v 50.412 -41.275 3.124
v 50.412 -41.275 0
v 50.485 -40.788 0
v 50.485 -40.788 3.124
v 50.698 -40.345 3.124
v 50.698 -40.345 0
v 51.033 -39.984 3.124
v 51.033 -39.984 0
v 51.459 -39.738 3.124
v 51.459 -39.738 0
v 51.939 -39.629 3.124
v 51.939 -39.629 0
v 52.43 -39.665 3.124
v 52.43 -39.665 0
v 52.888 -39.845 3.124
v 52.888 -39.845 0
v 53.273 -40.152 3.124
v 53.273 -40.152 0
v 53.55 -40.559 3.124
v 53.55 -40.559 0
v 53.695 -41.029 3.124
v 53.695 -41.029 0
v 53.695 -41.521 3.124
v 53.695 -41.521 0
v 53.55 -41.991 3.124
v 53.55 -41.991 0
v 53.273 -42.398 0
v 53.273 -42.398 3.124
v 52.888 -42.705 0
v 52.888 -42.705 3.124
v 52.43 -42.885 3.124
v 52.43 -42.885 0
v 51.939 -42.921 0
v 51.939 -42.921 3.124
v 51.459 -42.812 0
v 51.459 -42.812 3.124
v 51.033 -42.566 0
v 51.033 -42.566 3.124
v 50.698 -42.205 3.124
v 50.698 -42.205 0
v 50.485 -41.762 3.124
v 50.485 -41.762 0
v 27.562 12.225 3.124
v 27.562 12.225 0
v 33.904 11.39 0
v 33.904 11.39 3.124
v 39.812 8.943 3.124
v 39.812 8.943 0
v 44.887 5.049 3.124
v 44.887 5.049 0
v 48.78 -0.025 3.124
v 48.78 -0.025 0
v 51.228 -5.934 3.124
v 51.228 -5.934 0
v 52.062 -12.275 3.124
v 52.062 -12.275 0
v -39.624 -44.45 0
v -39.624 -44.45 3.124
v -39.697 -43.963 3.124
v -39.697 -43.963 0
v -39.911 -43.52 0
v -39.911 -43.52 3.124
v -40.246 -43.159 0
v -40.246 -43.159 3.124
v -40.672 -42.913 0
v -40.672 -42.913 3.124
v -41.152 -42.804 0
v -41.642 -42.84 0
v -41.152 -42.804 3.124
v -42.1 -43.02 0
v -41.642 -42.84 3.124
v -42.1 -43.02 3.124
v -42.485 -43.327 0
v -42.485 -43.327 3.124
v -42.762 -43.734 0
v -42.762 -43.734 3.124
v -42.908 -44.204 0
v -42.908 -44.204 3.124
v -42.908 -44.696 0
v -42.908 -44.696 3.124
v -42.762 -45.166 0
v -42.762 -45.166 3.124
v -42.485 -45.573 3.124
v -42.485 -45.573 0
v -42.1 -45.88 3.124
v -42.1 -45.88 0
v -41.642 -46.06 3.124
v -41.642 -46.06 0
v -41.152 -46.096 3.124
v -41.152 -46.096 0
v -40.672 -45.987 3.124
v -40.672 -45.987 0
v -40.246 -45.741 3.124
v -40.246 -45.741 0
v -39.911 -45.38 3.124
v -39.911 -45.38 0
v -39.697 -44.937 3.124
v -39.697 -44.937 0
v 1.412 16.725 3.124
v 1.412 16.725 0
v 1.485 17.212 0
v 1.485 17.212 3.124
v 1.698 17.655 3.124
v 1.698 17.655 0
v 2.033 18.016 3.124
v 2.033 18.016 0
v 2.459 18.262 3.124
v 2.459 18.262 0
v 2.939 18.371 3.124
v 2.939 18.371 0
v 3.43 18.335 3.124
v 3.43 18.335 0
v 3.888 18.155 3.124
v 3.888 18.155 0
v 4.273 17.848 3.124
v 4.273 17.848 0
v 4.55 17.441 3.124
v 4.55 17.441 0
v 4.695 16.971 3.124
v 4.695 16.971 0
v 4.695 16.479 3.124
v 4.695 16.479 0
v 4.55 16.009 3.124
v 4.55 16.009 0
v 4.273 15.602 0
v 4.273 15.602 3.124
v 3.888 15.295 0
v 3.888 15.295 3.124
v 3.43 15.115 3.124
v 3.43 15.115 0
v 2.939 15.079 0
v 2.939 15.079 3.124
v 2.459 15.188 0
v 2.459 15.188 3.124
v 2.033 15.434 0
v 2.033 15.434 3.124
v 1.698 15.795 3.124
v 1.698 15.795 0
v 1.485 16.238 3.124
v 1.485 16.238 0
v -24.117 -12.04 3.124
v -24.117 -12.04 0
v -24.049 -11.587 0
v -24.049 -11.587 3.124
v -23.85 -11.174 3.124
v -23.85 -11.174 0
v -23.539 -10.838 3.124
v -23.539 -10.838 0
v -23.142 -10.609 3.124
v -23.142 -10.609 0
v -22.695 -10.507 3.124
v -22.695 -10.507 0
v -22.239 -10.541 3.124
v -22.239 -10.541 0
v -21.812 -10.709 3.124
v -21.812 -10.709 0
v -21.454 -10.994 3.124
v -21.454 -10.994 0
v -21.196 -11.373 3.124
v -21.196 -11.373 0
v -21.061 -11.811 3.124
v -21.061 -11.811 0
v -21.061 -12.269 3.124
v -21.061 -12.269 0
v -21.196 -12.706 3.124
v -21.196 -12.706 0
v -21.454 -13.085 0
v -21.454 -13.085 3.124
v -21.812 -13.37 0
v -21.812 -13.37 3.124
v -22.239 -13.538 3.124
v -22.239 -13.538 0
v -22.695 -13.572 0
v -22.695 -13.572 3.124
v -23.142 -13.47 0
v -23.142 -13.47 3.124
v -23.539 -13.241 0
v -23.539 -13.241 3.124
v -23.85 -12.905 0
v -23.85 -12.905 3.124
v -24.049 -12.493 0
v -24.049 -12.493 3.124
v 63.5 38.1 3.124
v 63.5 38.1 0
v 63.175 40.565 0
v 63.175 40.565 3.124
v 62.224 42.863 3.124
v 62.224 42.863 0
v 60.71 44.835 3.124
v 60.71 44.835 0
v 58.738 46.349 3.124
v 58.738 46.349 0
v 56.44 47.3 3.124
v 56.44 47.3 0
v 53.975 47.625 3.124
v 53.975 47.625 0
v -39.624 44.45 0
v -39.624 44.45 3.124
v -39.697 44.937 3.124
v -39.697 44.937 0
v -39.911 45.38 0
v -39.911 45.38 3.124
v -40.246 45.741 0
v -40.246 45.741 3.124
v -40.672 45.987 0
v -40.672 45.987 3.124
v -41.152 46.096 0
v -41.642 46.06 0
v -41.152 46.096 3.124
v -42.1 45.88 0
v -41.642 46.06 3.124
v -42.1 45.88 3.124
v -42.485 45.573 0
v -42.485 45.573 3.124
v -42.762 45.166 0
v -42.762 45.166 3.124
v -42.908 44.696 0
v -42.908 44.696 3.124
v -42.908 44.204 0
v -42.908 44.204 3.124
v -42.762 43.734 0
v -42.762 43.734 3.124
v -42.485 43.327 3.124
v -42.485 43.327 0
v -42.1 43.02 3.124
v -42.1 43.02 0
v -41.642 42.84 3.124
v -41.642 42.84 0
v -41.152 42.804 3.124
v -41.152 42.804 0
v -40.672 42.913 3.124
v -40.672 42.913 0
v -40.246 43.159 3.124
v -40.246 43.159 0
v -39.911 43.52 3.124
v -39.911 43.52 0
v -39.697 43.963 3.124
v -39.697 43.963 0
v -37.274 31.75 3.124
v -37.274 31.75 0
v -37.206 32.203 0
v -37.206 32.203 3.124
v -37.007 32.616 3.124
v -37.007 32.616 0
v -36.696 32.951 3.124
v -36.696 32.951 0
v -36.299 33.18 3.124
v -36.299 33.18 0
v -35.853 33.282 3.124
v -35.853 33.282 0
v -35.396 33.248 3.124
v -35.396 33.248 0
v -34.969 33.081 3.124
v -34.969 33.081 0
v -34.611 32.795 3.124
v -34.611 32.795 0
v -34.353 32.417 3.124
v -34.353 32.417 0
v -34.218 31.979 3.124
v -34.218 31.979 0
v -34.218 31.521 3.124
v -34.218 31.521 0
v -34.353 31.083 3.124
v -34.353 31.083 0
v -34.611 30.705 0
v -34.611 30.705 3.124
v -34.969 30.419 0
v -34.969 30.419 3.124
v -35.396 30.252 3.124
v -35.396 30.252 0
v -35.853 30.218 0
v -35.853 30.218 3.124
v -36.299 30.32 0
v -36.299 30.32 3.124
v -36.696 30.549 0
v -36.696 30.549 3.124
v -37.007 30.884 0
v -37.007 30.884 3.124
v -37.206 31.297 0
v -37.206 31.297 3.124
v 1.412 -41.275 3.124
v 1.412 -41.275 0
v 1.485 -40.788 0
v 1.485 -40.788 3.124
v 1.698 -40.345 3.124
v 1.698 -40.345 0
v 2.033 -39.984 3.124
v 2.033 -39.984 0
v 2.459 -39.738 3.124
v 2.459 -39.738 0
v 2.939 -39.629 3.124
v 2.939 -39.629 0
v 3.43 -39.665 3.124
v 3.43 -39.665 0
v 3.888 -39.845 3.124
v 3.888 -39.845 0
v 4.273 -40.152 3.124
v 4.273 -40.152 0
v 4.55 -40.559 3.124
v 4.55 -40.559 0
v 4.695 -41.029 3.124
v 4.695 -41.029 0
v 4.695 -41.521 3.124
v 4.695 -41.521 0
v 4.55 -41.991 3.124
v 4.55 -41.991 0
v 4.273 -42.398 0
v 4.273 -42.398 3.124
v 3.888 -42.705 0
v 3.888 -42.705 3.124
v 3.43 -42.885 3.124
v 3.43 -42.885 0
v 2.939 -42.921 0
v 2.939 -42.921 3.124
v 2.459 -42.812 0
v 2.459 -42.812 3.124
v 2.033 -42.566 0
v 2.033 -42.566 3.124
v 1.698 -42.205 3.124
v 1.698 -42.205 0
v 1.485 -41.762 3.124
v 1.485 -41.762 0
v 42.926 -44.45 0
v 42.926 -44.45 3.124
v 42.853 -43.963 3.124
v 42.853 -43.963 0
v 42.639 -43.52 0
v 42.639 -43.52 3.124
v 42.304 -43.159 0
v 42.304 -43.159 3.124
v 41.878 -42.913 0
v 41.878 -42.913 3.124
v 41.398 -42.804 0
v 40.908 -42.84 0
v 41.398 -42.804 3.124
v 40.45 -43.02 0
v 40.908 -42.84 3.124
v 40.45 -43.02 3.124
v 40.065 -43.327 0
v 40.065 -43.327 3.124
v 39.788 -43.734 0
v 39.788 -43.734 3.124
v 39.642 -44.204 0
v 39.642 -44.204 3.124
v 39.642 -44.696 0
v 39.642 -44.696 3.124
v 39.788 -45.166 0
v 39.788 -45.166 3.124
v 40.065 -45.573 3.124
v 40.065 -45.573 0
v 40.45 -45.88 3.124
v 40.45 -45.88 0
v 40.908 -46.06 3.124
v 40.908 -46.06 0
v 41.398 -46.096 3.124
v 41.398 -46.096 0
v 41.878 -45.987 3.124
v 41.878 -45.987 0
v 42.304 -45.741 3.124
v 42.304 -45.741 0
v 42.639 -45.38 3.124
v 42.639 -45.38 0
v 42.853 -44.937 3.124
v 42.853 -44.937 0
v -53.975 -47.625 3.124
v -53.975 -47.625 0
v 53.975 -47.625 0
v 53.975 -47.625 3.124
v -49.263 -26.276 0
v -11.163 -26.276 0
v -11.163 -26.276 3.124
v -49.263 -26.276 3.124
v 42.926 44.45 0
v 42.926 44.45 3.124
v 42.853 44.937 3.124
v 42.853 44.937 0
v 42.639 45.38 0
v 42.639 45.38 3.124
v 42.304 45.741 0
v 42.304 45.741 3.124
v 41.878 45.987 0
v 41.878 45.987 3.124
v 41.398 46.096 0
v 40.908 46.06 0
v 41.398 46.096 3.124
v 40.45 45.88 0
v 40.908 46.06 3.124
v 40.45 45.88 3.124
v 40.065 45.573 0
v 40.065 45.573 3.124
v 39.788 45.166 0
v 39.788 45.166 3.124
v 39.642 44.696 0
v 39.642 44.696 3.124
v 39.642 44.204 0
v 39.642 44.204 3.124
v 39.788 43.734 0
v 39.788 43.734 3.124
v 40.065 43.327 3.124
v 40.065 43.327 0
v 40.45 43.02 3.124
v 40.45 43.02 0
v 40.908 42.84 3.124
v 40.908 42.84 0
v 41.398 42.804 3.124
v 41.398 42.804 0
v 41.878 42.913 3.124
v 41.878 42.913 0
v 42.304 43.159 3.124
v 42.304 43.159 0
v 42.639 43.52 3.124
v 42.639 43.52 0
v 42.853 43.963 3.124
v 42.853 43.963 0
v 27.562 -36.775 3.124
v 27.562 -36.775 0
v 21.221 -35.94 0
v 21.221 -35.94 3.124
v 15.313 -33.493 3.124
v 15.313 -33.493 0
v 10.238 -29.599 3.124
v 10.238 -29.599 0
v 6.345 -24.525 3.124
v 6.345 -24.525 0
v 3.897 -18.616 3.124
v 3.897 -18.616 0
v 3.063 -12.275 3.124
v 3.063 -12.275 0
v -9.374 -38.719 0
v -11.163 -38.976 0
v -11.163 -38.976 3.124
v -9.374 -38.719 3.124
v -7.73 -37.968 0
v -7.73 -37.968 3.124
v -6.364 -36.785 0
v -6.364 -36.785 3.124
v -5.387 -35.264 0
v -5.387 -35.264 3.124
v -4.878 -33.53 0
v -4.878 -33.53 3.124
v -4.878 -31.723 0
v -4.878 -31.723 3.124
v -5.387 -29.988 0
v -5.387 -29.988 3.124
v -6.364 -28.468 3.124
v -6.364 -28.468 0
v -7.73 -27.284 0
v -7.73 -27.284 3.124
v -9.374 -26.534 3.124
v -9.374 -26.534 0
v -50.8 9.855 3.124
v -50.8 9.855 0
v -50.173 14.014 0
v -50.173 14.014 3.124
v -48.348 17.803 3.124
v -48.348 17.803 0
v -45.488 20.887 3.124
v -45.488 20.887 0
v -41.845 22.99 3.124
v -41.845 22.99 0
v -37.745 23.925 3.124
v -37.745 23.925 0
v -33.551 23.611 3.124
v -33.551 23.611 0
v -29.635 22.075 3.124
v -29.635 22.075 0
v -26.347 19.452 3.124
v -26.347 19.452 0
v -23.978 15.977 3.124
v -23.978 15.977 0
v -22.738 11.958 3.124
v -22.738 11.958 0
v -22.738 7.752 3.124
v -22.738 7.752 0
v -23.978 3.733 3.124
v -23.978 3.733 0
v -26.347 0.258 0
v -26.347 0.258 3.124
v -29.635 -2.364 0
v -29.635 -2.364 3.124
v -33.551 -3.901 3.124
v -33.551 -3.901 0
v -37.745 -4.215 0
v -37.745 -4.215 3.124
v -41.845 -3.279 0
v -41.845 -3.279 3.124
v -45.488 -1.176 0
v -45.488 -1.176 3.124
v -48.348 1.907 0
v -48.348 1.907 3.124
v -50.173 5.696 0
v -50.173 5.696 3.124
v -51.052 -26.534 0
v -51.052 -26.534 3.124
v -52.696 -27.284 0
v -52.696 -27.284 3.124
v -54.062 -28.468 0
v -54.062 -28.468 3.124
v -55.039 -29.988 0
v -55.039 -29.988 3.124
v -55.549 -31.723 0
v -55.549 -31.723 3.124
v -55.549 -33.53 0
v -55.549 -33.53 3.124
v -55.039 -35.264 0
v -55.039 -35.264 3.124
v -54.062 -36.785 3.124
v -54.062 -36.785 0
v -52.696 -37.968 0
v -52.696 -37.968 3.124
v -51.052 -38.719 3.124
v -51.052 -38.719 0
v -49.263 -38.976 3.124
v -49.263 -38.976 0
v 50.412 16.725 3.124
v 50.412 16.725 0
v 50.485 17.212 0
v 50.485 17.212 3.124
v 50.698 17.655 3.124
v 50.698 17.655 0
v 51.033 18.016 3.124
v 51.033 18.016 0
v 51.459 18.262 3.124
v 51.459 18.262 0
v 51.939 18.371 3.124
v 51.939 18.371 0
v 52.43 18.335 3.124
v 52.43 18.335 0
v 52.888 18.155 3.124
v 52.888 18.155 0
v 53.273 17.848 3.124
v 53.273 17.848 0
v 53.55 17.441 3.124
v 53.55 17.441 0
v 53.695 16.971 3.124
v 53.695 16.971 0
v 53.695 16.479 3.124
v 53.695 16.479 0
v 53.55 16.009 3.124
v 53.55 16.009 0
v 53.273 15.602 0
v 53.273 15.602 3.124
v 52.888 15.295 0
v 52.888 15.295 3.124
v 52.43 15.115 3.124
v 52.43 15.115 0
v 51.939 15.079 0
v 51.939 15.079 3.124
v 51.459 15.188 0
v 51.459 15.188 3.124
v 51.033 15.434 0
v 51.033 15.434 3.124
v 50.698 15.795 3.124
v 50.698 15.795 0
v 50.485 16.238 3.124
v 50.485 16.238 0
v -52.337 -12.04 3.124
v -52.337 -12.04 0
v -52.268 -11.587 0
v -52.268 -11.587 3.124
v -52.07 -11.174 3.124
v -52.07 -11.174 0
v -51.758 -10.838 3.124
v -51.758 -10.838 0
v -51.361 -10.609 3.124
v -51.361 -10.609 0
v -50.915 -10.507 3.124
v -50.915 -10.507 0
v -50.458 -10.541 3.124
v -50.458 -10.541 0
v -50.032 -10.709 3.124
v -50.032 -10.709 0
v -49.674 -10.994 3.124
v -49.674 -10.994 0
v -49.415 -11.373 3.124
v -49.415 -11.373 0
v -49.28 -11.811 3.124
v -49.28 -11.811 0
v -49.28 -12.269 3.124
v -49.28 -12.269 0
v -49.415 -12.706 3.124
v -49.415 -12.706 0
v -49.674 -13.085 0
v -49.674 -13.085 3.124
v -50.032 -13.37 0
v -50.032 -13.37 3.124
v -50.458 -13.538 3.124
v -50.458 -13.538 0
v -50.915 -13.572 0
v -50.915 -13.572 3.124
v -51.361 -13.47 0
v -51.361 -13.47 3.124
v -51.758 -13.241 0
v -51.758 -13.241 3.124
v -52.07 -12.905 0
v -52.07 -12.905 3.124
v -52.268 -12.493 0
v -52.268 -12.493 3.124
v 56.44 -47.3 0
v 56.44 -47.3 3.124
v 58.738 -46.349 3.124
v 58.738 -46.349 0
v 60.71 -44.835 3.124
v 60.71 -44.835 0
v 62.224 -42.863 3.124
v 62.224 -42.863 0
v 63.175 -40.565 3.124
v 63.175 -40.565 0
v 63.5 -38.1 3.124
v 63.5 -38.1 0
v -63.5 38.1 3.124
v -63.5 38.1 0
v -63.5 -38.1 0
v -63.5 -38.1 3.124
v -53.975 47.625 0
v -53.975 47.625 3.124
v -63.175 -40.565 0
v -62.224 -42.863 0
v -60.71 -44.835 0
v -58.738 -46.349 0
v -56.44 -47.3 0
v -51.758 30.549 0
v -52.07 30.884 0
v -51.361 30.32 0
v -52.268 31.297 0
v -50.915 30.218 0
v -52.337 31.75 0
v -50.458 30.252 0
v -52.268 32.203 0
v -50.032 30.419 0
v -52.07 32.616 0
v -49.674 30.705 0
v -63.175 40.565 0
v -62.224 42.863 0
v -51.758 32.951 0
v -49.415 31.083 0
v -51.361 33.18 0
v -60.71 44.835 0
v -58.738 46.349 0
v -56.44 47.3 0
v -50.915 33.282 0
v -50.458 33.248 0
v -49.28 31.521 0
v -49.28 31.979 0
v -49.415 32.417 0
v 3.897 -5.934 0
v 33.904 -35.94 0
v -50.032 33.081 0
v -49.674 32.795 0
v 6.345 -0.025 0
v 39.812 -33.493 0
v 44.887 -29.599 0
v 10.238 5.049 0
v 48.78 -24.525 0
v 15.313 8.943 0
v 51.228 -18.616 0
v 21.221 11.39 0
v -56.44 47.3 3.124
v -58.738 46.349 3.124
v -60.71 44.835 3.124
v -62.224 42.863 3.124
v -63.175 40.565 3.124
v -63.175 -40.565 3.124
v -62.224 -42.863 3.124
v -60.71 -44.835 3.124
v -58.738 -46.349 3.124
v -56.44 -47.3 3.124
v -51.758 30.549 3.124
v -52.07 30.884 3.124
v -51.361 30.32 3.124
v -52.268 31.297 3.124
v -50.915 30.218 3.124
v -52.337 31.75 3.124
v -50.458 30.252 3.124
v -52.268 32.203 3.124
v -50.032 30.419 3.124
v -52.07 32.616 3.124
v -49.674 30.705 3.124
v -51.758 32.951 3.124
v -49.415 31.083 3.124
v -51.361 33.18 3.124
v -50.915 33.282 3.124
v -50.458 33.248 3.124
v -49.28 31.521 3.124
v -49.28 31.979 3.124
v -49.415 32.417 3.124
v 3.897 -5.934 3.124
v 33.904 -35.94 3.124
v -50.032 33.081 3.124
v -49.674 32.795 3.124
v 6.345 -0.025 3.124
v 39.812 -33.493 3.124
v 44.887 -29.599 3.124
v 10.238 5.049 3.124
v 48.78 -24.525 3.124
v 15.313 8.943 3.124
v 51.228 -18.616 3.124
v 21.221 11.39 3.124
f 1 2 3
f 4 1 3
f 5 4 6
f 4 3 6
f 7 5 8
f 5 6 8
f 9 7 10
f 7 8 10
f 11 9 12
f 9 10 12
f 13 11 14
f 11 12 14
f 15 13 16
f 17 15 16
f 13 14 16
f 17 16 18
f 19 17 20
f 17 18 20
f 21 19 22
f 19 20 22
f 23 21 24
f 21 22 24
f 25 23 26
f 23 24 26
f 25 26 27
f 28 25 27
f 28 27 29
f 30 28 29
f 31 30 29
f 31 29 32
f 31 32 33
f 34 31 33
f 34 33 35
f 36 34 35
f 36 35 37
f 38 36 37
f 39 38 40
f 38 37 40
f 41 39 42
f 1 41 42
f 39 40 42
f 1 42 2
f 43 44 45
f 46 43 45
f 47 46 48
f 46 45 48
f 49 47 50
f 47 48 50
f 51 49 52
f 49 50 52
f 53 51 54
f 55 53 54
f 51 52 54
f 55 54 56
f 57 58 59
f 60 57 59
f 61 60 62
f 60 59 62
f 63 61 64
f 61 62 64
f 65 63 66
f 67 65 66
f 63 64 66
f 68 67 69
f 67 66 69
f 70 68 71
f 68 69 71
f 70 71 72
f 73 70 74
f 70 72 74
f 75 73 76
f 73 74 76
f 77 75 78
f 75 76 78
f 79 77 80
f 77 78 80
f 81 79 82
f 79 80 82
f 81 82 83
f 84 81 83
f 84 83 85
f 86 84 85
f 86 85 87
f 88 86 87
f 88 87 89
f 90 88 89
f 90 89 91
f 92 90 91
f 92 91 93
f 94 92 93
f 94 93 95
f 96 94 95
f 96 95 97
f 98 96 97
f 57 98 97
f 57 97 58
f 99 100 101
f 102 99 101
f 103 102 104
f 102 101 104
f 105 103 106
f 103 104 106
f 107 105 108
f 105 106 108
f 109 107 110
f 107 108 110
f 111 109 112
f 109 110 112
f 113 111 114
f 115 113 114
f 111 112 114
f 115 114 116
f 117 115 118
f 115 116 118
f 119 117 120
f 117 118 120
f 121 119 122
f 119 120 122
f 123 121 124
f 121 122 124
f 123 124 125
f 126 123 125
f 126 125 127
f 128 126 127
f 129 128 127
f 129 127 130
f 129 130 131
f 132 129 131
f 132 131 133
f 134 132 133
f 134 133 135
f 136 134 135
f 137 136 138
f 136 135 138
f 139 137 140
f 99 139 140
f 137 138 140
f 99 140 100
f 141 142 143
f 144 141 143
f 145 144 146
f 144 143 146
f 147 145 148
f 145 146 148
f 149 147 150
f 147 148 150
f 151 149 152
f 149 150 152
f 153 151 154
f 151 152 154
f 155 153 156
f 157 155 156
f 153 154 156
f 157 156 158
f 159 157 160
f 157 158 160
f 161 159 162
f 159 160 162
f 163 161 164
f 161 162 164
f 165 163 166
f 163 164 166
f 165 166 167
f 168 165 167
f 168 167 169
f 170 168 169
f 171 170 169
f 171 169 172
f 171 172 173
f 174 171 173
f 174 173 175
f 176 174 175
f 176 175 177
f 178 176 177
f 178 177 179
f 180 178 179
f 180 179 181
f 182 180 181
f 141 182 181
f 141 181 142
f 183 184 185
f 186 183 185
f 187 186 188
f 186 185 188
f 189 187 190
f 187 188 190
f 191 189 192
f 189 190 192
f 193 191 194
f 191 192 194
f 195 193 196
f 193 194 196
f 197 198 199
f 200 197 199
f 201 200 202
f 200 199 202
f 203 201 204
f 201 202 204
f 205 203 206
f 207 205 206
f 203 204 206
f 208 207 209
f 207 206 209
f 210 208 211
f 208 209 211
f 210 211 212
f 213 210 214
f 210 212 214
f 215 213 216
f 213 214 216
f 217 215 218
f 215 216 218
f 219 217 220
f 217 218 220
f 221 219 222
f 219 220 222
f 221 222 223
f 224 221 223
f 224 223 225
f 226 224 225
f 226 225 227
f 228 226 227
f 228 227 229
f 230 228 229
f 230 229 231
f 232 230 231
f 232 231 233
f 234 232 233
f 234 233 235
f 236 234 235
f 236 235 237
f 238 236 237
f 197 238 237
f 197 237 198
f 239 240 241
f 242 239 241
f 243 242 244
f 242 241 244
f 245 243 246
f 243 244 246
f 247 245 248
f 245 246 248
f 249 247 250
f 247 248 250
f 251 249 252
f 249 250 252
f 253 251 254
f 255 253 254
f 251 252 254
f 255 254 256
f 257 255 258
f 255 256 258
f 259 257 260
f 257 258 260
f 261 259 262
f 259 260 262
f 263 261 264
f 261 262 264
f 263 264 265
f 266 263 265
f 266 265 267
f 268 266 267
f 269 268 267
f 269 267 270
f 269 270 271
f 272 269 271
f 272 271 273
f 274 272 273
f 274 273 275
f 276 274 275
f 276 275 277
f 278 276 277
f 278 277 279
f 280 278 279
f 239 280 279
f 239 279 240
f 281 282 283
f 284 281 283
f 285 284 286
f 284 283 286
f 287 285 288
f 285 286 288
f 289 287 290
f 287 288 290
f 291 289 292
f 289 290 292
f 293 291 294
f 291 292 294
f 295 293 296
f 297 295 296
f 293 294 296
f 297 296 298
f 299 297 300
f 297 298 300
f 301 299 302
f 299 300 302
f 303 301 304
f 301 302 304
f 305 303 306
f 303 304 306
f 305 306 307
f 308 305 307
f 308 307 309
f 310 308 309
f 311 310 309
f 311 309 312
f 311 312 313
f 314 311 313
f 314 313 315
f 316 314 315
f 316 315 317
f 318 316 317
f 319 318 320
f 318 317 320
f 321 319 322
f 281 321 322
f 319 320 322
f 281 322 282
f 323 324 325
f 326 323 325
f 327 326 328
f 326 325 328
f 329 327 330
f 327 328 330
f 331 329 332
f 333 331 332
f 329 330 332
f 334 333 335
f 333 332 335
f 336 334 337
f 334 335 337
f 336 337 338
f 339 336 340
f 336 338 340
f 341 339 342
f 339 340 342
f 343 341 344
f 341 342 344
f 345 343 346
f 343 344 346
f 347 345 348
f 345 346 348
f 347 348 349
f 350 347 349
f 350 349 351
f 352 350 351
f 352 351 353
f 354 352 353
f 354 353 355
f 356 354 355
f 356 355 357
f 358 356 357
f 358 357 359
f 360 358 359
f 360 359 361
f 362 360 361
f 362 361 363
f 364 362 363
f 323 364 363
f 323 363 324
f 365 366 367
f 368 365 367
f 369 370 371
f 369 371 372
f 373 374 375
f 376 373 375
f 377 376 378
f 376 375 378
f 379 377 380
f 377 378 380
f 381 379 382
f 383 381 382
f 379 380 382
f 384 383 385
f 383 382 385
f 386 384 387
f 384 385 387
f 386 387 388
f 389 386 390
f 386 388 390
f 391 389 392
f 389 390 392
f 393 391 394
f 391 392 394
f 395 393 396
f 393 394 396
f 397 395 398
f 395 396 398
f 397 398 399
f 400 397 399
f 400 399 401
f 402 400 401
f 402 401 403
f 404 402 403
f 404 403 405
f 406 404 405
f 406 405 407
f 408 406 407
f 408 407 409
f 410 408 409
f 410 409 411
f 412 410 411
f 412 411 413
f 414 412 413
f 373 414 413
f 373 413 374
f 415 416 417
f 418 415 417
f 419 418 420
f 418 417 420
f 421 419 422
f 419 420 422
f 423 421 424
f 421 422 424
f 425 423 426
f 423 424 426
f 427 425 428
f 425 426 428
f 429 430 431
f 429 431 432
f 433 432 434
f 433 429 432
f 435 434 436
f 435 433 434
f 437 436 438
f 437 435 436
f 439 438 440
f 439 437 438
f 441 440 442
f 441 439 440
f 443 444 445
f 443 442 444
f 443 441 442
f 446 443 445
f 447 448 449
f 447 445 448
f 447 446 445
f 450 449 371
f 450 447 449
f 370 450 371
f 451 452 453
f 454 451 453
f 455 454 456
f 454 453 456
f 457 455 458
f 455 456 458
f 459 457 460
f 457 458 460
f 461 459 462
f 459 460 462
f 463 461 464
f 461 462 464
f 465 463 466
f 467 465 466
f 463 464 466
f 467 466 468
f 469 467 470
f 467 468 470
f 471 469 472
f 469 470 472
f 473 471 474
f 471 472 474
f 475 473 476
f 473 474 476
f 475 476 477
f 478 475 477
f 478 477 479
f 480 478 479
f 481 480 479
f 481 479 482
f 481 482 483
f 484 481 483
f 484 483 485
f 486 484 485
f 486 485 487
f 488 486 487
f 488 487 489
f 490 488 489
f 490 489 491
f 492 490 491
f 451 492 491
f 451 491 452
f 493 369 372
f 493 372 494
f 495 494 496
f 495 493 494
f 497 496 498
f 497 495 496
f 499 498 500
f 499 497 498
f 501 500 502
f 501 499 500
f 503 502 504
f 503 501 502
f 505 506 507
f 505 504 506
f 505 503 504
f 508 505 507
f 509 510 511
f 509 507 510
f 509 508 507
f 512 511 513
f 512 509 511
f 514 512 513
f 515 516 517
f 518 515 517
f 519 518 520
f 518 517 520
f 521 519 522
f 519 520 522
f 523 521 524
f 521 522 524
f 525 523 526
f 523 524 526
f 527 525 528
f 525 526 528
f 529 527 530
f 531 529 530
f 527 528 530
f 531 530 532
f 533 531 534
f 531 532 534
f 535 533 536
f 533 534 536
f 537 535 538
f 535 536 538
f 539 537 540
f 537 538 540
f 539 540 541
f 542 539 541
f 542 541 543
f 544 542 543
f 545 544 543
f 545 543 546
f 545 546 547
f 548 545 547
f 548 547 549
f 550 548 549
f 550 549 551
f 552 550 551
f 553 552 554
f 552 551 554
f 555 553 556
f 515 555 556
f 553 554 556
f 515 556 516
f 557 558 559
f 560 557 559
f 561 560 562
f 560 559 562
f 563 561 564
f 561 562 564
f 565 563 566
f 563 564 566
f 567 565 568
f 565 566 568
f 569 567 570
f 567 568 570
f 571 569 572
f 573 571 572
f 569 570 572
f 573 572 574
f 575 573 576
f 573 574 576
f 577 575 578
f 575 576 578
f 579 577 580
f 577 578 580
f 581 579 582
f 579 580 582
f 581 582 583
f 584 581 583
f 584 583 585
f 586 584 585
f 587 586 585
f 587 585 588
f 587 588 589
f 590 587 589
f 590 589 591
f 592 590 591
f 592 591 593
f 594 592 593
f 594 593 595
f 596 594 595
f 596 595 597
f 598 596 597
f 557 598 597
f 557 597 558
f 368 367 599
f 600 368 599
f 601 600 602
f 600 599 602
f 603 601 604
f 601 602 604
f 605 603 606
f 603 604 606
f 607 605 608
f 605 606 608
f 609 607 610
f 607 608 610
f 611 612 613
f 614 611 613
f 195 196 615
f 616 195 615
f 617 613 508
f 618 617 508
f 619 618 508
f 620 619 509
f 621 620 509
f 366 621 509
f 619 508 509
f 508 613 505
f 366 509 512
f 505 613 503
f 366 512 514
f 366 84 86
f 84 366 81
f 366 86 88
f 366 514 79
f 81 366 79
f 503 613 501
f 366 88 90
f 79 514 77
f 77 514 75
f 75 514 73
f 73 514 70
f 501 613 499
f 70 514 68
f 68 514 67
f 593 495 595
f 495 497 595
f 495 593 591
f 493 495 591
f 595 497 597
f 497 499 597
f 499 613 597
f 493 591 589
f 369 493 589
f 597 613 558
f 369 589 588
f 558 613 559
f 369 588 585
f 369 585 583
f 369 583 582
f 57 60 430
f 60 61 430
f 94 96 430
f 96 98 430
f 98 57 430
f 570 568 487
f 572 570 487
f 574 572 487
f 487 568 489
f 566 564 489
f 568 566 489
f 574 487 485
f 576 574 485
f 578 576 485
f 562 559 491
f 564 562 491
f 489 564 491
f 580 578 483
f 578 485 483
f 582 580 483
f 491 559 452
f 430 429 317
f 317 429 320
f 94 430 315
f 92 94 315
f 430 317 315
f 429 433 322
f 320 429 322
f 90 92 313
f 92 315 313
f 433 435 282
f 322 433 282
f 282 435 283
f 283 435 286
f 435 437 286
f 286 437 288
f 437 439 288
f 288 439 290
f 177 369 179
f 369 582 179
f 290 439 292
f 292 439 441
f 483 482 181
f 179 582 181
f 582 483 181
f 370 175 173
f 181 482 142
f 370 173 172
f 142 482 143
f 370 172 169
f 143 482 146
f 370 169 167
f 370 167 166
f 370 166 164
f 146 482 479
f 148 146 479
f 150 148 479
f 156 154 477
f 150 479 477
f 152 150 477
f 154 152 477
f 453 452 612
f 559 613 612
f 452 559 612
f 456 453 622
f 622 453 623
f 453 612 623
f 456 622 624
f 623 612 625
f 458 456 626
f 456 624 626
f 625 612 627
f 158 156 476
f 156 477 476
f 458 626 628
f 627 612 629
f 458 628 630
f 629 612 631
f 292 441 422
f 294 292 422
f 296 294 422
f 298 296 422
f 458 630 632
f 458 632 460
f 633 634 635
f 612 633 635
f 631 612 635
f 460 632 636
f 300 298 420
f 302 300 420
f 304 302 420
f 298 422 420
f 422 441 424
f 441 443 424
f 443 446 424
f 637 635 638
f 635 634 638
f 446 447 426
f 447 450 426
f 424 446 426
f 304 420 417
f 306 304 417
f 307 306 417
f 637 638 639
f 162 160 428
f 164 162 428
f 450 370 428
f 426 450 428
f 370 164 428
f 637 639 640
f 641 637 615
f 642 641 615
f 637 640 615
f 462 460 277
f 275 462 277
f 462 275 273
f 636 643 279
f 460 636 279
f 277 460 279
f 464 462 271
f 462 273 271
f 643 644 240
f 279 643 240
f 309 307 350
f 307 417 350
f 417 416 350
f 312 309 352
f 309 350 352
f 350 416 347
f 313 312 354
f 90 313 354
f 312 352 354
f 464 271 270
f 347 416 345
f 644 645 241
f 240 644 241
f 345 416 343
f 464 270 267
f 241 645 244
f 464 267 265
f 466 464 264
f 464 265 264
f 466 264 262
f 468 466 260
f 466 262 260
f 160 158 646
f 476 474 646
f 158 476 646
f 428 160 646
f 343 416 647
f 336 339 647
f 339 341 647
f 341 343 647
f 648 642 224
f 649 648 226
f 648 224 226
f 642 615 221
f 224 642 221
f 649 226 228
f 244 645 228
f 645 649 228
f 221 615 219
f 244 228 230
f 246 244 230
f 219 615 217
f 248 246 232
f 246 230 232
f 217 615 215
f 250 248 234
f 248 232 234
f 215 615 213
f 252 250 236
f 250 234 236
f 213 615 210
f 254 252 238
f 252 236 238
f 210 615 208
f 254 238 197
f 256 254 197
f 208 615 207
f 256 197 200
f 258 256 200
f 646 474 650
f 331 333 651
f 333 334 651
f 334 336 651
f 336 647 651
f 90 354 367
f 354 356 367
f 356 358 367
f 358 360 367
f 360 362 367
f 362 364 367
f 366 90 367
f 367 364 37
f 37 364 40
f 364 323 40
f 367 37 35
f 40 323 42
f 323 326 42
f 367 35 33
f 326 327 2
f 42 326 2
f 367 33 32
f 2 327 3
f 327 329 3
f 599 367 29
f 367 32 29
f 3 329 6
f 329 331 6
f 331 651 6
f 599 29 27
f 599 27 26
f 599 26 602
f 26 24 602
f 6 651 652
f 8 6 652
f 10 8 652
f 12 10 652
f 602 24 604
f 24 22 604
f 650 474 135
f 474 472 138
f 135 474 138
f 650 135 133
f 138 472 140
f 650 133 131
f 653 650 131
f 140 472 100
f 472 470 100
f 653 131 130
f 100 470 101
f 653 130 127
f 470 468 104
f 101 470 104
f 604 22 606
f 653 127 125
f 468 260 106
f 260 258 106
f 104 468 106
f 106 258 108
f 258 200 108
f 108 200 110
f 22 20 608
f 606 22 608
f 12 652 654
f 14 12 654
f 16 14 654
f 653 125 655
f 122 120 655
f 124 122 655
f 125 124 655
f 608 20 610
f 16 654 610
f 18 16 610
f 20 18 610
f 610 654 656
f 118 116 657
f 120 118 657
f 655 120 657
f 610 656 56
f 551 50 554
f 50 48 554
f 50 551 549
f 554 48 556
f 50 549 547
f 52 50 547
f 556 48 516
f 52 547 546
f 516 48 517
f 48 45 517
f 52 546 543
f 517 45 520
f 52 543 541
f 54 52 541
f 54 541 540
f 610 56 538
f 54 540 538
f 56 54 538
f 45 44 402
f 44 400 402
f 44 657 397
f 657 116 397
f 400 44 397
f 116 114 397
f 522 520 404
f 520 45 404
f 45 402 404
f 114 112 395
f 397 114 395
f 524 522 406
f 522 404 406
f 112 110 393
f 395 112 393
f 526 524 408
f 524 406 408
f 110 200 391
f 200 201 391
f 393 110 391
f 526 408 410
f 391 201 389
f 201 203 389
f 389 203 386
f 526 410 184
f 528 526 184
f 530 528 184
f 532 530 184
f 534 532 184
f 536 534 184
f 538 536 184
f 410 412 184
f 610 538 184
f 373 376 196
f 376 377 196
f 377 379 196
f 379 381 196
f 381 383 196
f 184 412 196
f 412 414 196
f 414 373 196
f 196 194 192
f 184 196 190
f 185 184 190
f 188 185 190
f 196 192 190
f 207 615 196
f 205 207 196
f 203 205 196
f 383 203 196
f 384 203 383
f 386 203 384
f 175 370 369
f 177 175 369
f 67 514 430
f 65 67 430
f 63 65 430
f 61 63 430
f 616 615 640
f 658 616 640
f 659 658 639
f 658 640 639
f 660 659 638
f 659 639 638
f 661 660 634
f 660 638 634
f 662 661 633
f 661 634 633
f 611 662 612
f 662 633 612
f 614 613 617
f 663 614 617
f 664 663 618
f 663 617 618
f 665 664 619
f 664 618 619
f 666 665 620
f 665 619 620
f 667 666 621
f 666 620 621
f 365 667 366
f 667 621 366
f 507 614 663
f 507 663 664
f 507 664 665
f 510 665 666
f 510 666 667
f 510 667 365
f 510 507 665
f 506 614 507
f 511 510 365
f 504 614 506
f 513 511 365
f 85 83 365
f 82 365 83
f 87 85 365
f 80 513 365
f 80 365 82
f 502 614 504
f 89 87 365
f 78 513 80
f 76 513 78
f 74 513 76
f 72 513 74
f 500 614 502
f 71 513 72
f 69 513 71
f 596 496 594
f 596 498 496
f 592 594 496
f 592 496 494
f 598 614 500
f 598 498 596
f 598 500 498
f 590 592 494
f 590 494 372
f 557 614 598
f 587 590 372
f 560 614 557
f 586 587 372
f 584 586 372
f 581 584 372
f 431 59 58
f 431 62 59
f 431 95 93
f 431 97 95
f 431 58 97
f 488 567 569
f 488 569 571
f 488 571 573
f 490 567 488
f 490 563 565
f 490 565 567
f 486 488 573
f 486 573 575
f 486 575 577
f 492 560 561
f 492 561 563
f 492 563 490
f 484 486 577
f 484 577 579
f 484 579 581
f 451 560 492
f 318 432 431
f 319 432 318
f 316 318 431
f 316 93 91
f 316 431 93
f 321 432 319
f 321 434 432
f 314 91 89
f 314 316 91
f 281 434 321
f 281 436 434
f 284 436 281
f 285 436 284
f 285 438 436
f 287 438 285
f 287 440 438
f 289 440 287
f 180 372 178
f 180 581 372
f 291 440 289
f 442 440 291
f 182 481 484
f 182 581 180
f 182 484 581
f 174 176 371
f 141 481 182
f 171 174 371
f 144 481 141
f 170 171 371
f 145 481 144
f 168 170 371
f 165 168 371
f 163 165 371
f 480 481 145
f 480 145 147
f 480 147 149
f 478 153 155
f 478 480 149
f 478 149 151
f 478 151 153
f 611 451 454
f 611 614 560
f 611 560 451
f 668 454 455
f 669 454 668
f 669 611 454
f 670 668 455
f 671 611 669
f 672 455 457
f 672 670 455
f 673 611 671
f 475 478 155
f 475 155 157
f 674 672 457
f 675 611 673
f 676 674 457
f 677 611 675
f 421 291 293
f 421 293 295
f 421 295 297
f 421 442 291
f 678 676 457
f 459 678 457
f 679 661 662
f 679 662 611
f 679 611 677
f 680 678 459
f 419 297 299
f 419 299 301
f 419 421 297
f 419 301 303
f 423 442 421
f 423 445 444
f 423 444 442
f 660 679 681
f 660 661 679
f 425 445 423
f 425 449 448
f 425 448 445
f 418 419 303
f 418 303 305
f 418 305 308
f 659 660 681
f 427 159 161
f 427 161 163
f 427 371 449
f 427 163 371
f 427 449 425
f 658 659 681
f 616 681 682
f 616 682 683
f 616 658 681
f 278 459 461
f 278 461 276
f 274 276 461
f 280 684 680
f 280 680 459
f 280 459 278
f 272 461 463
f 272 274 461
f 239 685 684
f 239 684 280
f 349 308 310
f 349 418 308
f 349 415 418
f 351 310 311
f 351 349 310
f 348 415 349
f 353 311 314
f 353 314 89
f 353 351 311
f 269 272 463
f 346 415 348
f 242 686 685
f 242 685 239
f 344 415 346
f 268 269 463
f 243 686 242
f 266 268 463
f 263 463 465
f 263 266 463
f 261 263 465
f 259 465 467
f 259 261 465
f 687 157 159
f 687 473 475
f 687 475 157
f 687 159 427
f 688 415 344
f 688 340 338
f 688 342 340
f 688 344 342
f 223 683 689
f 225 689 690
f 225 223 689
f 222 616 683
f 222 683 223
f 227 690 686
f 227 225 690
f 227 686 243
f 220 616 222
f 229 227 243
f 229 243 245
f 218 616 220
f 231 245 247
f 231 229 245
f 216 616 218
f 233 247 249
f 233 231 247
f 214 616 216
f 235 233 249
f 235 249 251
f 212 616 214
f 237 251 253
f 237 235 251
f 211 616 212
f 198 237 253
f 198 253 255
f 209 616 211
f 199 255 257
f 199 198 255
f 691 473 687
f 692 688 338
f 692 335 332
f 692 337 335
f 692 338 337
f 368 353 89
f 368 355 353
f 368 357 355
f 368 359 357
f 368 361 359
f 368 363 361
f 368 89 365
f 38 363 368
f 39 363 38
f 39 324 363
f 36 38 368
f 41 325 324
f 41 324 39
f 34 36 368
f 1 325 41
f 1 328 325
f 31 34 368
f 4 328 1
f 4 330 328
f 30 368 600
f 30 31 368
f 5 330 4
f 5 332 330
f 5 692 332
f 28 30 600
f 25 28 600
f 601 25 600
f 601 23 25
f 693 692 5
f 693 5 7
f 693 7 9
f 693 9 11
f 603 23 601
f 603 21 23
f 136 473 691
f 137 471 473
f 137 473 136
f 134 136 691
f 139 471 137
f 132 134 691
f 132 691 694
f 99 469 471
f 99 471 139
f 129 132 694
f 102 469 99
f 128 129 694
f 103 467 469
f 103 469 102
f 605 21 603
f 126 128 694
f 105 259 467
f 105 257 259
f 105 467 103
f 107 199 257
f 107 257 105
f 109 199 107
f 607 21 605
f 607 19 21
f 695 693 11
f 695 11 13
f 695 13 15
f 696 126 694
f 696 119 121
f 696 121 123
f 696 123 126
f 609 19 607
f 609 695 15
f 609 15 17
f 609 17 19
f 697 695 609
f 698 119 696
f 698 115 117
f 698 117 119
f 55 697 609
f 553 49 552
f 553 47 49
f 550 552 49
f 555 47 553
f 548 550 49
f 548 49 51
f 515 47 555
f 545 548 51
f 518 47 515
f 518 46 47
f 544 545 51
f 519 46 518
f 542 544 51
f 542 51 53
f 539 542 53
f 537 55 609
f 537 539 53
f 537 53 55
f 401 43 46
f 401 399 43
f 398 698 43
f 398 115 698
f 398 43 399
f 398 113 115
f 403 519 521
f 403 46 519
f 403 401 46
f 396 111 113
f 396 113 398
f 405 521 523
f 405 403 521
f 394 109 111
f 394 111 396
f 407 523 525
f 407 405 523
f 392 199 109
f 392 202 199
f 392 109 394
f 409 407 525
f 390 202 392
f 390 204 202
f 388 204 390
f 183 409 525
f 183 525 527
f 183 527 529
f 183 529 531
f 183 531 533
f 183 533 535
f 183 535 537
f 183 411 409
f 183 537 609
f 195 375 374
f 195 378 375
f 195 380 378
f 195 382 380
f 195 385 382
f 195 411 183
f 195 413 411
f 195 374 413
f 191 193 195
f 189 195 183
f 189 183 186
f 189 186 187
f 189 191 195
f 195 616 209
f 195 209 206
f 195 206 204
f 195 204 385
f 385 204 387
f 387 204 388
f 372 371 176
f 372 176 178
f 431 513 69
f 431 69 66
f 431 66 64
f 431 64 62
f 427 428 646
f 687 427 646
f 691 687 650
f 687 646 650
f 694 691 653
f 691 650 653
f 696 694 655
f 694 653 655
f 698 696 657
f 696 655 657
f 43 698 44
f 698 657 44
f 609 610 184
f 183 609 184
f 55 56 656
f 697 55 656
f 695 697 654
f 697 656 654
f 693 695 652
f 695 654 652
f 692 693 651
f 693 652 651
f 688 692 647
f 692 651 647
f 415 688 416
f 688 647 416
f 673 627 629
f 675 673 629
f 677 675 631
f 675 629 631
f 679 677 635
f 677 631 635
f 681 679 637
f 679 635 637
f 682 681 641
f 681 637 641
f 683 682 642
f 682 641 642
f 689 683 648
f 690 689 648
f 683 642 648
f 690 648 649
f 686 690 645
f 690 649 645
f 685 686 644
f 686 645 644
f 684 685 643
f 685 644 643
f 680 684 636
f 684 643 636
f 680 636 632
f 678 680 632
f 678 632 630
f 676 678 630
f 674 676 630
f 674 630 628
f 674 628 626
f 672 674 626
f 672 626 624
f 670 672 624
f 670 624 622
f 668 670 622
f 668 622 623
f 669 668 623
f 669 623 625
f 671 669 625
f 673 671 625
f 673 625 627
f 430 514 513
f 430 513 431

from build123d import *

# Parameters (mm, degrees)
SALIENTE_EXTRUIR1_DEPTH = 3.1242
CROQUIS2_R              = 1.651
CORTAR_EXTRUIR1_DEPTH   = 4.1242
CROQUIS3_R              = 1.651
CORTAR_EXTRUIR2_DEPTH   = 3.1242
CROQUIS4_R              = 14.1097
CROQUIS4_R_2            = 1.5367
CORTAR_EXTRUIR3_DEPTH   = 4.1242


with BuildPart() as part:
    # Croquis1 → Saliente-Extruir1 (new body)
    with BuildSketch(Plane.XY):
        with BuildLine():
            Line((-53.975, -47.625), (53.975, -47.625))
            ThreePointArc((53.975, -47.625), (60.710192091, -44.835192091), (63.5, -38.1))
            Line((63.5, -38.1), (63.5, 38.1))
            ThreePointArc((63.5, 38.1), (60.710192091, 44.835192091), (53.975, 47.625))
            Line((53.975, 47.625), (-53.975, 47.625))
            ThreePointArc((-53.975, 47.625), (-60.710192091, 44.835192091), (-63.5, 38.1))
            Line((-63.5, 38.1), (-63.5, -38.1))
            ThreePointArc((-63.5, -38.1), (-60.710192091, -44.835192091), (-53.975, -47.625))
        make_face()
    extrude(amount=SALIENTE_EXTRUIR1_DEPTH)

    # Croquis2 → Cortar-Extruir1 (cut, through all)
    with BuildSketch(Plane.XY.offset(3.1242)):
        with Locations((-41.275, 44.45)):
            Circle(CROQUIS2_R)
        with Locations((41.275, 44.45)):
            Circle(CROQUIS2_R)
        with Locations((41.275, -44.45)):
            Circle(CROQUIS2_R)
        with Locations((-41.275, -44.45)):
            Circle(CROQUIS2_R)
    extrude(amount=-CORTAR_EXTRUIR1_DEPTH, mode=Mode.SUBTRACT)

    # Croquis3 → Cortar-Extruir2 (cut)
    with BuildSketch(Plane(origin=(0, 0, 0), x_dir=(-1, 0, 0), z_dir=(0, 0, -1))):
        with BuildLine():
            ThreePointArc((-27.5625, 12.225), (-44.886616139, 5.049116139), (-52.0625, -12.275))
            Line((-52.0625, -12.275), (-27.5625, -12.275))
            Line((-27.5625, -12.275), (-27.5625, 12.225))
        make_face()
        with BuildLine():
            Line((-27.5625, -12.275), (-52.0625, -12.275))
            ThreePointArc((-52.0625, -12.275), (-44.886616139, -29.599116139), (-27.5625, -36.775))
            Line((-27.5625, -36.775), (-27.5625, -12.275))
        make_face()
        with BuildLine():
            Line((-27.5625, 12.225), (-27.5625, -12.275))
            Line((-27.5625, -12.275), (-3.0625, -12.275))
            ThreePointArc((-3.0625, -12.275), (-10.238383861, 5.049116139), (-27.5625, 12.225))
        make_face()
        with BuildLine():
            Line((-3.0625, -12.275), (-27.5625, -12.275))
            Line((-27.5625, -12.275), (-27.5625, -36.775))
            ThreePointArc((-27.5625, -36.775), (-10.238383861, -29.599116139), (-3.0625, -12.275))
        make_face()
        with Locations((-3.0625, 16.725)):
            Circle(CROQUIS3_R)
        with Locations((-52.0625, 16.725)):
            Circle(CROQUIS3_R)
        with Locations((-52.0625, -41.275)):
            Circle(CROQUIS3_R)
        with Locations((-3.0625, -41.275)):
            Circle(CROQUIS3_R)
    extrude(amount=-CORTAR_EXTRUIR2_DEPTH, mode=Mode.SUBTRACT)

    # Croquis4 → Cortar-Extruir3 (cut, through all)
    with BuildSketch(Plane(origin=(0, 0, 0), x_dir=(-1, 0, 0), z_dir=(0, 0, -1))):
        with Locations((36.6903, 9.8552)):
            Circle(CROQUIS4_R)
        with Locations((35.7378, 31.75)):
            Circle(CROQUIS4_R_2)
        with Locations((50.8, 31.75)):
            Circle(CROQUIS4_R_2)
        with Locations((50.8, -12.0396)):
            Circle(CROQUIS4_R_2)
        with Locations((22.5806, -12.0396)):
            Circle(CROQUIS4_R_2)
        with BuildLine():
            Line((11.1633, -26.2763), (49.2633, -26.2763))
            ThreePointArc((49.2633, -26.2763), (55.6133, -32.6263), (49.2633, -38.9763))
            Line((49.2633, -38.9763), (11.1633, -38.9763))
            ThreePointArc((11.1633, -38.9763), (4.8133, -32.6263), (11.1633, -26.2763))
        make_face()
    extrude(amount=-CORTAR_EXTRUIR3_DEPTH, mode=Mode.SUBTRACT)


solid = part.part
